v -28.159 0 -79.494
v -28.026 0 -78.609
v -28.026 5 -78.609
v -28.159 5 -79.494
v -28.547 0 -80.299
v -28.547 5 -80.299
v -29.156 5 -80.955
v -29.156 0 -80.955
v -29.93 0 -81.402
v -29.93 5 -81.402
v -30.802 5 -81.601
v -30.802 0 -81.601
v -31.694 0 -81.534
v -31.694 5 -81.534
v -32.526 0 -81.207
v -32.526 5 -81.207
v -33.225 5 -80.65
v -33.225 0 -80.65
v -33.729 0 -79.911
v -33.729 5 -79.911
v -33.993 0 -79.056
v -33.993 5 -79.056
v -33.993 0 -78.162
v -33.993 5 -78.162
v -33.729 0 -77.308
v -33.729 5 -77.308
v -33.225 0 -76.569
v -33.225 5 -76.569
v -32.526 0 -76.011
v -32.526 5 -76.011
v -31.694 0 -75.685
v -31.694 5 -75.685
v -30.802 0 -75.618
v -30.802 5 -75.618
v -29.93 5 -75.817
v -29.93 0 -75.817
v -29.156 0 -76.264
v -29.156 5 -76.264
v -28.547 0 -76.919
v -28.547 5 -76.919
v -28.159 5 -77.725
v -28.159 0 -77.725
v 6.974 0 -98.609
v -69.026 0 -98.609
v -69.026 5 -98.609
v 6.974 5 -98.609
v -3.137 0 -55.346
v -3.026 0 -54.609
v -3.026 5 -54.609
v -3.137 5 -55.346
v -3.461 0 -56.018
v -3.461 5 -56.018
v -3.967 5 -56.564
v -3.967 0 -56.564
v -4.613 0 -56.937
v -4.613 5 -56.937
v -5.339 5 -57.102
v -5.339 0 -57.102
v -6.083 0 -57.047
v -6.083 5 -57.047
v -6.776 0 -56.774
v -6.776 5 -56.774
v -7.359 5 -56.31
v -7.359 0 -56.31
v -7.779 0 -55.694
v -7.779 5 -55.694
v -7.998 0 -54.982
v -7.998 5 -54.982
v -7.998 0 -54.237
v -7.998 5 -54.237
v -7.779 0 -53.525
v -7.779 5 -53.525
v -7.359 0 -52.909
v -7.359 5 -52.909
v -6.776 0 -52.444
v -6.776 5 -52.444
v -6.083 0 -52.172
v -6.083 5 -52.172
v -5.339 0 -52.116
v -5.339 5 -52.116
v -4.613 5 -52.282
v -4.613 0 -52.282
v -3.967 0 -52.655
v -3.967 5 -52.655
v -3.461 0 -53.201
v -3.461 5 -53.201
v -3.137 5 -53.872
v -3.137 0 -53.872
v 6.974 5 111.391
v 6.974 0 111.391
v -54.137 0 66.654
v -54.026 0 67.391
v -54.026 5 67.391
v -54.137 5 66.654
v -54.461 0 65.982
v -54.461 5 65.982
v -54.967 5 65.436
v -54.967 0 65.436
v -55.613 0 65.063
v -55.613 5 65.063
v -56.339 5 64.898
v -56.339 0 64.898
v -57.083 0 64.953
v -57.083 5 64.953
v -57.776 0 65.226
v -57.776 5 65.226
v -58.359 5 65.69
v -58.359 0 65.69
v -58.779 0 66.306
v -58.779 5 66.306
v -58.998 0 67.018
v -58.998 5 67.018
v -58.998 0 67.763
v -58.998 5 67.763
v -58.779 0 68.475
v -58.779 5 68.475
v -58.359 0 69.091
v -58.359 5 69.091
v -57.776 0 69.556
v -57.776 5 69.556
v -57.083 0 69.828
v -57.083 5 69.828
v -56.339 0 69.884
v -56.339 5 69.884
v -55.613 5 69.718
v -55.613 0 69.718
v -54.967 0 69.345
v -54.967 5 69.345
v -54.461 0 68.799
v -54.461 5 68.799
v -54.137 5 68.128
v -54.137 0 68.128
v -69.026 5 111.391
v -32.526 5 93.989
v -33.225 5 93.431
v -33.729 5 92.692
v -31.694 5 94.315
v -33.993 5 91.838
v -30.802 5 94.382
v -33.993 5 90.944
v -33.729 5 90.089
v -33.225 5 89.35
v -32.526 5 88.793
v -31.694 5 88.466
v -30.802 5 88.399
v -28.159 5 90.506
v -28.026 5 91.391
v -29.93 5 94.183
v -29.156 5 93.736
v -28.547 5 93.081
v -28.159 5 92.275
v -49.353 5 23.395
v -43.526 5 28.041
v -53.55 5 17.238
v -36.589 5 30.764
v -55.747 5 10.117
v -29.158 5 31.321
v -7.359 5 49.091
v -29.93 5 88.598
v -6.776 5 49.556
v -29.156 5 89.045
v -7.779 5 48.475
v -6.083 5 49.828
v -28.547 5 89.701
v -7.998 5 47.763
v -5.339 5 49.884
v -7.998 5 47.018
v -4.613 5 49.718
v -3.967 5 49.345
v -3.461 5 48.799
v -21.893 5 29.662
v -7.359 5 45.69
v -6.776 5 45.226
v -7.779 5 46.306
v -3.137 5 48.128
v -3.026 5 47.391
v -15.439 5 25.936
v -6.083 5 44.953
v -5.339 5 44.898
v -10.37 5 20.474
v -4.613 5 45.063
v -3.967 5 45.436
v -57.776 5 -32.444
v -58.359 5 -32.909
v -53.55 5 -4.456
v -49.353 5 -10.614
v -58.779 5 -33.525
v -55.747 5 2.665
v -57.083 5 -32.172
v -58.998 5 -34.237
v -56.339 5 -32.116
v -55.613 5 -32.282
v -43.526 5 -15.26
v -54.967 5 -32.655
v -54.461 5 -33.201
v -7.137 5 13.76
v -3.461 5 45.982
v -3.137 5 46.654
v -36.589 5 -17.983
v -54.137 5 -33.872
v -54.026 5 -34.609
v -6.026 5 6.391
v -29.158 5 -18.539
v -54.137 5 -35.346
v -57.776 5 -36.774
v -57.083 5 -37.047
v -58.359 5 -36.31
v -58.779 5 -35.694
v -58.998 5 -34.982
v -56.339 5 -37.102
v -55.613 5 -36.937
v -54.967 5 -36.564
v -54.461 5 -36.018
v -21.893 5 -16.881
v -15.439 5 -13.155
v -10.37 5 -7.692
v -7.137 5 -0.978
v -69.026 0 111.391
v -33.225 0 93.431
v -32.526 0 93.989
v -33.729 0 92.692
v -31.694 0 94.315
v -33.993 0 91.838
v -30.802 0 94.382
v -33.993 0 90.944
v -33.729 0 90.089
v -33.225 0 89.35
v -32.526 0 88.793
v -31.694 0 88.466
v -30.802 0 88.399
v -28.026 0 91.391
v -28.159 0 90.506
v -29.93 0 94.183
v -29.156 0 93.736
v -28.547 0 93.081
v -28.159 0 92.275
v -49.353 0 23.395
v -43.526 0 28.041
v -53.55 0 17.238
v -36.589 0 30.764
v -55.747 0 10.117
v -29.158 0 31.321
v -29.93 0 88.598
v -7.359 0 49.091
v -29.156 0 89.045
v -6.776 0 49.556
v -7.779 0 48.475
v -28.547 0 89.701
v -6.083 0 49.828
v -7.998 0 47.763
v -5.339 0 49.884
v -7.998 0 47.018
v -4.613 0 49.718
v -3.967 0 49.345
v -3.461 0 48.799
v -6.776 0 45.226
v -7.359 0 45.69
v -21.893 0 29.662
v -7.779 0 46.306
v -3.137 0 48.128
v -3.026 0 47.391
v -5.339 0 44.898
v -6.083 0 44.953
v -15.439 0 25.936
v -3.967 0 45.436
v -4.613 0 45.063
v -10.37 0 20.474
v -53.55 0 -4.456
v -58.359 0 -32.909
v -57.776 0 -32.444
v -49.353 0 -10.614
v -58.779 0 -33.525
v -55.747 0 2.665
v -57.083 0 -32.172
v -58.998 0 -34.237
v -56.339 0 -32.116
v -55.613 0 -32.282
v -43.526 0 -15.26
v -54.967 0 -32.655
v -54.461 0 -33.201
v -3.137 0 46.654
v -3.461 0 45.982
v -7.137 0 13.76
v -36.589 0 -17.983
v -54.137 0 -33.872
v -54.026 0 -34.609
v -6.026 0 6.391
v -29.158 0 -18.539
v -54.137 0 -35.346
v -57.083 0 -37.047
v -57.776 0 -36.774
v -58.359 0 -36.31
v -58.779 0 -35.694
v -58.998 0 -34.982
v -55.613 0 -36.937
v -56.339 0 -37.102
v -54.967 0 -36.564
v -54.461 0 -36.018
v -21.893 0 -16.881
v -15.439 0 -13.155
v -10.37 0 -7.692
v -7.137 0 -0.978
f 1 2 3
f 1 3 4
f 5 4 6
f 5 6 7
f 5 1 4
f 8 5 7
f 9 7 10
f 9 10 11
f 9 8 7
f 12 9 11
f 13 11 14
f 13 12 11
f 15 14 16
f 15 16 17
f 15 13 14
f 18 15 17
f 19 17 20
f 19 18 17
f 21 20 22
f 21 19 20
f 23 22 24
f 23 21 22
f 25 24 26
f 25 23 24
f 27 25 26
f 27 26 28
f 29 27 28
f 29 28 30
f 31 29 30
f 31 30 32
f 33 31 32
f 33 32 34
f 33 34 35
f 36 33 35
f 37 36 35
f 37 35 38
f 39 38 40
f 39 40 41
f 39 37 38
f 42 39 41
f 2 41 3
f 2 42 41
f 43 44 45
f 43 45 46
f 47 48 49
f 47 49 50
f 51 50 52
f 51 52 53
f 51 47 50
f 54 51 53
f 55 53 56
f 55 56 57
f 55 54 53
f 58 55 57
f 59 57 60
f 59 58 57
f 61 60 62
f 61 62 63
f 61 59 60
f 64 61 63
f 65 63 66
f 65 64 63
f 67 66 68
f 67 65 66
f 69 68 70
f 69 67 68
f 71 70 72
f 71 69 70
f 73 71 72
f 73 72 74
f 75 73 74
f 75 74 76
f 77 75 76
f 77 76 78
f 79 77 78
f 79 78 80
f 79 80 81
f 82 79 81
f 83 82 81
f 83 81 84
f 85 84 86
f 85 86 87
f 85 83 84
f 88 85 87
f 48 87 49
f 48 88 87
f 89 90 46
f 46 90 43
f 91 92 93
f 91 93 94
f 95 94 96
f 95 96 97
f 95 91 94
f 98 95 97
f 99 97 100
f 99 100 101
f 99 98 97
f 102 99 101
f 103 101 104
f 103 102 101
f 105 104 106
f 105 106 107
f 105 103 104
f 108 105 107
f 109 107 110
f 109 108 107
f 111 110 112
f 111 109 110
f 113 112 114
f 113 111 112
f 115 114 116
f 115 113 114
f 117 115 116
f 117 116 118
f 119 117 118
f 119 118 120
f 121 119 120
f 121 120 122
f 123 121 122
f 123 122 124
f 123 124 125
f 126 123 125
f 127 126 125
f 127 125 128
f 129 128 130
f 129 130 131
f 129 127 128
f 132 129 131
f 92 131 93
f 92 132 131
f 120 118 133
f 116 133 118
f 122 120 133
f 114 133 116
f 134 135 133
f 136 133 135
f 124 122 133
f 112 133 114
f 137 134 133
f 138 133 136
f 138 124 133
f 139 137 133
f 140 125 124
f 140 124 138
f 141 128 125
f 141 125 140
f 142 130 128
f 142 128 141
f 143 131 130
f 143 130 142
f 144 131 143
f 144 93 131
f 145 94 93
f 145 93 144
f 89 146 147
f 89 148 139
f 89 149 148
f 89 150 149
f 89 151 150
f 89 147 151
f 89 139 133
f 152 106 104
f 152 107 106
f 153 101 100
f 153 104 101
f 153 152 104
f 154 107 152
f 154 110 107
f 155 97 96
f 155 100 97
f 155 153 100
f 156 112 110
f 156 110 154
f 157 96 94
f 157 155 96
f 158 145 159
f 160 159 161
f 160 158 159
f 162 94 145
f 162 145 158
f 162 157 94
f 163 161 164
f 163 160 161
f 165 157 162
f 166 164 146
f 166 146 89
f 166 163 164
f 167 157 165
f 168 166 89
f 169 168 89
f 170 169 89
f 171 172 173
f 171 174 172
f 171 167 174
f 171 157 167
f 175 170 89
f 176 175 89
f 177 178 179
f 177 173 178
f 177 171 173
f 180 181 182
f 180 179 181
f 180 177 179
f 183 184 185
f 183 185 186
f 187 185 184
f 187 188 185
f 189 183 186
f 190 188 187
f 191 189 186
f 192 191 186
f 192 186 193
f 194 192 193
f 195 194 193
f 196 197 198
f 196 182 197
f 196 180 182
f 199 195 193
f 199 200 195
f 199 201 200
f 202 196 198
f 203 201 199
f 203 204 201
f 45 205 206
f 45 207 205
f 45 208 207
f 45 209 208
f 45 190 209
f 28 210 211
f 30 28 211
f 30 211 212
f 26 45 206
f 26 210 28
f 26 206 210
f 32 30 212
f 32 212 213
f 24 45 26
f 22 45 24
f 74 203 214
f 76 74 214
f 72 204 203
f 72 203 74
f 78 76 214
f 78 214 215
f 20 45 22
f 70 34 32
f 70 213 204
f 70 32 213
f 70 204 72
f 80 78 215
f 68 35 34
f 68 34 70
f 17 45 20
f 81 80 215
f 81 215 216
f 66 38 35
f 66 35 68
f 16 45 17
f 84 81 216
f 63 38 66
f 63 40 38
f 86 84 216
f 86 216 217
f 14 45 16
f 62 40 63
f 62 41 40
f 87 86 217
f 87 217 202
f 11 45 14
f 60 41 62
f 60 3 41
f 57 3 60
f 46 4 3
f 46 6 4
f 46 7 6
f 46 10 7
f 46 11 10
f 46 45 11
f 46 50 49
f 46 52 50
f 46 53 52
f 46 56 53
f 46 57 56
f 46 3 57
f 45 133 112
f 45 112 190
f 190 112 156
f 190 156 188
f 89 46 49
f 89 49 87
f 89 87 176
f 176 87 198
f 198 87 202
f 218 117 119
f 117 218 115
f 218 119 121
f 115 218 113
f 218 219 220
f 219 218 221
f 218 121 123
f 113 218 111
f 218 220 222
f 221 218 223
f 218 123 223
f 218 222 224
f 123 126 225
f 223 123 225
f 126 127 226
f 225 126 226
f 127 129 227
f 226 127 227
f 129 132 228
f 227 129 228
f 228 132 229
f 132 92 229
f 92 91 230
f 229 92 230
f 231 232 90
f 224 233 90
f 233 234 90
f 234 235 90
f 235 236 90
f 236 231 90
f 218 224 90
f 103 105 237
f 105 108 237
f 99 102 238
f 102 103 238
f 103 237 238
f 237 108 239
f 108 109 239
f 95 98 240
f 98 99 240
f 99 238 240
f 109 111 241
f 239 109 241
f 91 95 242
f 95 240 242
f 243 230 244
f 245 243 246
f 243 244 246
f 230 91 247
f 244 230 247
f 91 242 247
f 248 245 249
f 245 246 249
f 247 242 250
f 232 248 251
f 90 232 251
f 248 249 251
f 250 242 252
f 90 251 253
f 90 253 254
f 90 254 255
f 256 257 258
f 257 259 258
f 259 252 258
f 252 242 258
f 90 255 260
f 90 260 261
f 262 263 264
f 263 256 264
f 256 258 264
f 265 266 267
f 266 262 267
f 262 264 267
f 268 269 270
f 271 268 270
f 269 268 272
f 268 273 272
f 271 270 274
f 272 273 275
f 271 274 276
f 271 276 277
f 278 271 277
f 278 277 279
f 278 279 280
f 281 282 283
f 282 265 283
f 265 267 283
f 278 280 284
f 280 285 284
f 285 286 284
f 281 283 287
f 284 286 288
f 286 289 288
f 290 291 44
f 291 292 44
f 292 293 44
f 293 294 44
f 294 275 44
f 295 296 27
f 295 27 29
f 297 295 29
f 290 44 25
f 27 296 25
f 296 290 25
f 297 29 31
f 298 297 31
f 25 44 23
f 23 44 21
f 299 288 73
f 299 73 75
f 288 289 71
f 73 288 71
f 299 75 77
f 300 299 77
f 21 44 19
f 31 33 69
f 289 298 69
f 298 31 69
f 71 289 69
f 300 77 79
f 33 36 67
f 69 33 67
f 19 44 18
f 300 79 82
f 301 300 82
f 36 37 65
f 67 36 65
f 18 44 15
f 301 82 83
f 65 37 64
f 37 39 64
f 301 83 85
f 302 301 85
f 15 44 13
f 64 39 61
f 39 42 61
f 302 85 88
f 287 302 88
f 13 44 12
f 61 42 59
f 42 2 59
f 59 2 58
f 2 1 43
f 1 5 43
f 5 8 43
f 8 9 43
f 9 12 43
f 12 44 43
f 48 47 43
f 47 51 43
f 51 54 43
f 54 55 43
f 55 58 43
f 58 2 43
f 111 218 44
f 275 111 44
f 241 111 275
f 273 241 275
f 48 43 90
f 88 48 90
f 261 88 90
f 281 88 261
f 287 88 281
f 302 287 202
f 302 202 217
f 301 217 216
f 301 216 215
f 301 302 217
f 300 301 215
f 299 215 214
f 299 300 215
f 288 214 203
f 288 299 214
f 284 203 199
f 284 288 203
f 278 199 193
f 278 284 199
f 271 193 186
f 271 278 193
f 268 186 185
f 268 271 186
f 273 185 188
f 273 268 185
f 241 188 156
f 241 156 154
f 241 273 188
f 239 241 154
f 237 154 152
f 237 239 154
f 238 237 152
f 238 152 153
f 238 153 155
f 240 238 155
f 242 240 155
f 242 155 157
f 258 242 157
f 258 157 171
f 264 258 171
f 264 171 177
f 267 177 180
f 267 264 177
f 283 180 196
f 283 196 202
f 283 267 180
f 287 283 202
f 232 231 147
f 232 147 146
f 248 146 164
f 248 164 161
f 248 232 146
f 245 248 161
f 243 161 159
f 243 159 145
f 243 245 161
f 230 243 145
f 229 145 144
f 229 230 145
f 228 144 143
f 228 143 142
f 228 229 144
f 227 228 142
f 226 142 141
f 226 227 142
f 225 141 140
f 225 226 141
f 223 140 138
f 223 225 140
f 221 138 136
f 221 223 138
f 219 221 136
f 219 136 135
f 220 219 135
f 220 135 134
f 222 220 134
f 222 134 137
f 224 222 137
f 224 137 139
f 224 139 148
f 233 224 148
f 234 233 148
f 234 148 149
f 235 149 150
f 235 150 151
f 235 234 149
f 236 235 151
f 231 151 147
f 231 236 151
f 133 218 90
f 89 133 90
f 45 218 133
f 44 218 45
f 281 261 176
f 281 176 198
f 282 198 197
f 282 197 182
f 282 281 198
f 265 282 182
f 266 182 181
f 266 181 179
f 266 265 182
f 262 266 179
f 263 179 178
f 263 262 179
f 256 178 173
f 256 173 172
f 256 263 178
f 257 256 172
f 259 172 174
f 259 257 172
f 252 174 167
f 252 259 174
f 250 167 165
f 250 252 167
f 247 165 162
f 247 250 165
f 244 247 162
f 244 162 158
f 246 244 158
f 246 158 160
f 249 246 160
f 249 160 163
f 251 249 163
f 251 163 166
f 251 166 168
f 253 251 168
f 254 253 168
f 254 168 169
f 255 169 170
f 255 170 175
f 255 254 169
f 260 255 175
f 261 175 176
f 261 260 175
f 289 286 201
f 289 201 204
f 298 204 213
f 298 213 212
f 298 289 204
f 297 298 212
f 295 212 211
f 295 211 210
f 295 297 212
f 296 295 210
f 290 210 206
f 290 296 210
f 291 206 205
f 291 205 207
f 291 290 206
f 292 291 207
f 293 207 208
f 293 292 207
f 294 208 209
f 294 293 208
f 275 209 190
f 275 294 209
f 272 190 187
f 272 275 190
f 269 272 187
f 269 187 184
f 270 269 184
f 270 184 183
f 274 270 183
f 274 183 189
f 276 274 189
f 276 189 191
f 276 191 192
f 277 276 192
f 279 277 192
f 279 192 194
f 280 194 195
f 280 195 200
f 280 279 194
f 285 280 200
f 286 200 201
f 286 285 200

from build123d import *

# Parameters (mm, degrees)
SKETCH1_W           = 76
SKETCH1_H           = 210
SKETCH1_R           = 3
SKETCH1_R_2         = 2.5
SKETCH1_R_3         = 25
BOSS_EXTRUDE1_DEPTH = 5


with BuildPart() as part:
    # Sketch1 → Boss-Extrude1 (new body)
    with BuildSketch(Plane(origin=(0, 0, 0), x_dir=(1, 0, 0), z_dir=(0, 1, 0))):
        with Locations((-31.026205917, -6.39064)):
            Rectangle(SKETCH1_W, SKETCH1_H)
        with Locations((-31.026205917, 78.60936)):
            Circle(SKETCH1_R, mode=Mode.SUBTRACT)
        with Locations((-31.026205917, -91.39064)):
            Circle(SKETCH1_R, mode=Mode.SUBTRACT)
        with Locations((-56.526205917, 34.60936)):
            Circle(SKETCH1_R_2, mode=Mode.SUBTRACT)
        with Locations((-5.526205917, 54.60936)):
            Circle(SKETCH1_R_2, mode=Mode.SUBTRACT)
        with Locations((-56.526205917, -67.39064)):
            Circle(SKETCH1_R_2, mode=Mode.SUBTRACT)
        with Locations((-5.526205917, -47.39064)):
            Circle(SKETCH1_R_2, mode=Mode.SUBTRACT)
        with Locations((-31.026205917, -6.39064)):
            Circle(SKETCH1_R_3, mode=Mode.SUBTRACT)
    extrude(amount=BOSS_EXTRUDE1_DEPTH)


solid = part.part
